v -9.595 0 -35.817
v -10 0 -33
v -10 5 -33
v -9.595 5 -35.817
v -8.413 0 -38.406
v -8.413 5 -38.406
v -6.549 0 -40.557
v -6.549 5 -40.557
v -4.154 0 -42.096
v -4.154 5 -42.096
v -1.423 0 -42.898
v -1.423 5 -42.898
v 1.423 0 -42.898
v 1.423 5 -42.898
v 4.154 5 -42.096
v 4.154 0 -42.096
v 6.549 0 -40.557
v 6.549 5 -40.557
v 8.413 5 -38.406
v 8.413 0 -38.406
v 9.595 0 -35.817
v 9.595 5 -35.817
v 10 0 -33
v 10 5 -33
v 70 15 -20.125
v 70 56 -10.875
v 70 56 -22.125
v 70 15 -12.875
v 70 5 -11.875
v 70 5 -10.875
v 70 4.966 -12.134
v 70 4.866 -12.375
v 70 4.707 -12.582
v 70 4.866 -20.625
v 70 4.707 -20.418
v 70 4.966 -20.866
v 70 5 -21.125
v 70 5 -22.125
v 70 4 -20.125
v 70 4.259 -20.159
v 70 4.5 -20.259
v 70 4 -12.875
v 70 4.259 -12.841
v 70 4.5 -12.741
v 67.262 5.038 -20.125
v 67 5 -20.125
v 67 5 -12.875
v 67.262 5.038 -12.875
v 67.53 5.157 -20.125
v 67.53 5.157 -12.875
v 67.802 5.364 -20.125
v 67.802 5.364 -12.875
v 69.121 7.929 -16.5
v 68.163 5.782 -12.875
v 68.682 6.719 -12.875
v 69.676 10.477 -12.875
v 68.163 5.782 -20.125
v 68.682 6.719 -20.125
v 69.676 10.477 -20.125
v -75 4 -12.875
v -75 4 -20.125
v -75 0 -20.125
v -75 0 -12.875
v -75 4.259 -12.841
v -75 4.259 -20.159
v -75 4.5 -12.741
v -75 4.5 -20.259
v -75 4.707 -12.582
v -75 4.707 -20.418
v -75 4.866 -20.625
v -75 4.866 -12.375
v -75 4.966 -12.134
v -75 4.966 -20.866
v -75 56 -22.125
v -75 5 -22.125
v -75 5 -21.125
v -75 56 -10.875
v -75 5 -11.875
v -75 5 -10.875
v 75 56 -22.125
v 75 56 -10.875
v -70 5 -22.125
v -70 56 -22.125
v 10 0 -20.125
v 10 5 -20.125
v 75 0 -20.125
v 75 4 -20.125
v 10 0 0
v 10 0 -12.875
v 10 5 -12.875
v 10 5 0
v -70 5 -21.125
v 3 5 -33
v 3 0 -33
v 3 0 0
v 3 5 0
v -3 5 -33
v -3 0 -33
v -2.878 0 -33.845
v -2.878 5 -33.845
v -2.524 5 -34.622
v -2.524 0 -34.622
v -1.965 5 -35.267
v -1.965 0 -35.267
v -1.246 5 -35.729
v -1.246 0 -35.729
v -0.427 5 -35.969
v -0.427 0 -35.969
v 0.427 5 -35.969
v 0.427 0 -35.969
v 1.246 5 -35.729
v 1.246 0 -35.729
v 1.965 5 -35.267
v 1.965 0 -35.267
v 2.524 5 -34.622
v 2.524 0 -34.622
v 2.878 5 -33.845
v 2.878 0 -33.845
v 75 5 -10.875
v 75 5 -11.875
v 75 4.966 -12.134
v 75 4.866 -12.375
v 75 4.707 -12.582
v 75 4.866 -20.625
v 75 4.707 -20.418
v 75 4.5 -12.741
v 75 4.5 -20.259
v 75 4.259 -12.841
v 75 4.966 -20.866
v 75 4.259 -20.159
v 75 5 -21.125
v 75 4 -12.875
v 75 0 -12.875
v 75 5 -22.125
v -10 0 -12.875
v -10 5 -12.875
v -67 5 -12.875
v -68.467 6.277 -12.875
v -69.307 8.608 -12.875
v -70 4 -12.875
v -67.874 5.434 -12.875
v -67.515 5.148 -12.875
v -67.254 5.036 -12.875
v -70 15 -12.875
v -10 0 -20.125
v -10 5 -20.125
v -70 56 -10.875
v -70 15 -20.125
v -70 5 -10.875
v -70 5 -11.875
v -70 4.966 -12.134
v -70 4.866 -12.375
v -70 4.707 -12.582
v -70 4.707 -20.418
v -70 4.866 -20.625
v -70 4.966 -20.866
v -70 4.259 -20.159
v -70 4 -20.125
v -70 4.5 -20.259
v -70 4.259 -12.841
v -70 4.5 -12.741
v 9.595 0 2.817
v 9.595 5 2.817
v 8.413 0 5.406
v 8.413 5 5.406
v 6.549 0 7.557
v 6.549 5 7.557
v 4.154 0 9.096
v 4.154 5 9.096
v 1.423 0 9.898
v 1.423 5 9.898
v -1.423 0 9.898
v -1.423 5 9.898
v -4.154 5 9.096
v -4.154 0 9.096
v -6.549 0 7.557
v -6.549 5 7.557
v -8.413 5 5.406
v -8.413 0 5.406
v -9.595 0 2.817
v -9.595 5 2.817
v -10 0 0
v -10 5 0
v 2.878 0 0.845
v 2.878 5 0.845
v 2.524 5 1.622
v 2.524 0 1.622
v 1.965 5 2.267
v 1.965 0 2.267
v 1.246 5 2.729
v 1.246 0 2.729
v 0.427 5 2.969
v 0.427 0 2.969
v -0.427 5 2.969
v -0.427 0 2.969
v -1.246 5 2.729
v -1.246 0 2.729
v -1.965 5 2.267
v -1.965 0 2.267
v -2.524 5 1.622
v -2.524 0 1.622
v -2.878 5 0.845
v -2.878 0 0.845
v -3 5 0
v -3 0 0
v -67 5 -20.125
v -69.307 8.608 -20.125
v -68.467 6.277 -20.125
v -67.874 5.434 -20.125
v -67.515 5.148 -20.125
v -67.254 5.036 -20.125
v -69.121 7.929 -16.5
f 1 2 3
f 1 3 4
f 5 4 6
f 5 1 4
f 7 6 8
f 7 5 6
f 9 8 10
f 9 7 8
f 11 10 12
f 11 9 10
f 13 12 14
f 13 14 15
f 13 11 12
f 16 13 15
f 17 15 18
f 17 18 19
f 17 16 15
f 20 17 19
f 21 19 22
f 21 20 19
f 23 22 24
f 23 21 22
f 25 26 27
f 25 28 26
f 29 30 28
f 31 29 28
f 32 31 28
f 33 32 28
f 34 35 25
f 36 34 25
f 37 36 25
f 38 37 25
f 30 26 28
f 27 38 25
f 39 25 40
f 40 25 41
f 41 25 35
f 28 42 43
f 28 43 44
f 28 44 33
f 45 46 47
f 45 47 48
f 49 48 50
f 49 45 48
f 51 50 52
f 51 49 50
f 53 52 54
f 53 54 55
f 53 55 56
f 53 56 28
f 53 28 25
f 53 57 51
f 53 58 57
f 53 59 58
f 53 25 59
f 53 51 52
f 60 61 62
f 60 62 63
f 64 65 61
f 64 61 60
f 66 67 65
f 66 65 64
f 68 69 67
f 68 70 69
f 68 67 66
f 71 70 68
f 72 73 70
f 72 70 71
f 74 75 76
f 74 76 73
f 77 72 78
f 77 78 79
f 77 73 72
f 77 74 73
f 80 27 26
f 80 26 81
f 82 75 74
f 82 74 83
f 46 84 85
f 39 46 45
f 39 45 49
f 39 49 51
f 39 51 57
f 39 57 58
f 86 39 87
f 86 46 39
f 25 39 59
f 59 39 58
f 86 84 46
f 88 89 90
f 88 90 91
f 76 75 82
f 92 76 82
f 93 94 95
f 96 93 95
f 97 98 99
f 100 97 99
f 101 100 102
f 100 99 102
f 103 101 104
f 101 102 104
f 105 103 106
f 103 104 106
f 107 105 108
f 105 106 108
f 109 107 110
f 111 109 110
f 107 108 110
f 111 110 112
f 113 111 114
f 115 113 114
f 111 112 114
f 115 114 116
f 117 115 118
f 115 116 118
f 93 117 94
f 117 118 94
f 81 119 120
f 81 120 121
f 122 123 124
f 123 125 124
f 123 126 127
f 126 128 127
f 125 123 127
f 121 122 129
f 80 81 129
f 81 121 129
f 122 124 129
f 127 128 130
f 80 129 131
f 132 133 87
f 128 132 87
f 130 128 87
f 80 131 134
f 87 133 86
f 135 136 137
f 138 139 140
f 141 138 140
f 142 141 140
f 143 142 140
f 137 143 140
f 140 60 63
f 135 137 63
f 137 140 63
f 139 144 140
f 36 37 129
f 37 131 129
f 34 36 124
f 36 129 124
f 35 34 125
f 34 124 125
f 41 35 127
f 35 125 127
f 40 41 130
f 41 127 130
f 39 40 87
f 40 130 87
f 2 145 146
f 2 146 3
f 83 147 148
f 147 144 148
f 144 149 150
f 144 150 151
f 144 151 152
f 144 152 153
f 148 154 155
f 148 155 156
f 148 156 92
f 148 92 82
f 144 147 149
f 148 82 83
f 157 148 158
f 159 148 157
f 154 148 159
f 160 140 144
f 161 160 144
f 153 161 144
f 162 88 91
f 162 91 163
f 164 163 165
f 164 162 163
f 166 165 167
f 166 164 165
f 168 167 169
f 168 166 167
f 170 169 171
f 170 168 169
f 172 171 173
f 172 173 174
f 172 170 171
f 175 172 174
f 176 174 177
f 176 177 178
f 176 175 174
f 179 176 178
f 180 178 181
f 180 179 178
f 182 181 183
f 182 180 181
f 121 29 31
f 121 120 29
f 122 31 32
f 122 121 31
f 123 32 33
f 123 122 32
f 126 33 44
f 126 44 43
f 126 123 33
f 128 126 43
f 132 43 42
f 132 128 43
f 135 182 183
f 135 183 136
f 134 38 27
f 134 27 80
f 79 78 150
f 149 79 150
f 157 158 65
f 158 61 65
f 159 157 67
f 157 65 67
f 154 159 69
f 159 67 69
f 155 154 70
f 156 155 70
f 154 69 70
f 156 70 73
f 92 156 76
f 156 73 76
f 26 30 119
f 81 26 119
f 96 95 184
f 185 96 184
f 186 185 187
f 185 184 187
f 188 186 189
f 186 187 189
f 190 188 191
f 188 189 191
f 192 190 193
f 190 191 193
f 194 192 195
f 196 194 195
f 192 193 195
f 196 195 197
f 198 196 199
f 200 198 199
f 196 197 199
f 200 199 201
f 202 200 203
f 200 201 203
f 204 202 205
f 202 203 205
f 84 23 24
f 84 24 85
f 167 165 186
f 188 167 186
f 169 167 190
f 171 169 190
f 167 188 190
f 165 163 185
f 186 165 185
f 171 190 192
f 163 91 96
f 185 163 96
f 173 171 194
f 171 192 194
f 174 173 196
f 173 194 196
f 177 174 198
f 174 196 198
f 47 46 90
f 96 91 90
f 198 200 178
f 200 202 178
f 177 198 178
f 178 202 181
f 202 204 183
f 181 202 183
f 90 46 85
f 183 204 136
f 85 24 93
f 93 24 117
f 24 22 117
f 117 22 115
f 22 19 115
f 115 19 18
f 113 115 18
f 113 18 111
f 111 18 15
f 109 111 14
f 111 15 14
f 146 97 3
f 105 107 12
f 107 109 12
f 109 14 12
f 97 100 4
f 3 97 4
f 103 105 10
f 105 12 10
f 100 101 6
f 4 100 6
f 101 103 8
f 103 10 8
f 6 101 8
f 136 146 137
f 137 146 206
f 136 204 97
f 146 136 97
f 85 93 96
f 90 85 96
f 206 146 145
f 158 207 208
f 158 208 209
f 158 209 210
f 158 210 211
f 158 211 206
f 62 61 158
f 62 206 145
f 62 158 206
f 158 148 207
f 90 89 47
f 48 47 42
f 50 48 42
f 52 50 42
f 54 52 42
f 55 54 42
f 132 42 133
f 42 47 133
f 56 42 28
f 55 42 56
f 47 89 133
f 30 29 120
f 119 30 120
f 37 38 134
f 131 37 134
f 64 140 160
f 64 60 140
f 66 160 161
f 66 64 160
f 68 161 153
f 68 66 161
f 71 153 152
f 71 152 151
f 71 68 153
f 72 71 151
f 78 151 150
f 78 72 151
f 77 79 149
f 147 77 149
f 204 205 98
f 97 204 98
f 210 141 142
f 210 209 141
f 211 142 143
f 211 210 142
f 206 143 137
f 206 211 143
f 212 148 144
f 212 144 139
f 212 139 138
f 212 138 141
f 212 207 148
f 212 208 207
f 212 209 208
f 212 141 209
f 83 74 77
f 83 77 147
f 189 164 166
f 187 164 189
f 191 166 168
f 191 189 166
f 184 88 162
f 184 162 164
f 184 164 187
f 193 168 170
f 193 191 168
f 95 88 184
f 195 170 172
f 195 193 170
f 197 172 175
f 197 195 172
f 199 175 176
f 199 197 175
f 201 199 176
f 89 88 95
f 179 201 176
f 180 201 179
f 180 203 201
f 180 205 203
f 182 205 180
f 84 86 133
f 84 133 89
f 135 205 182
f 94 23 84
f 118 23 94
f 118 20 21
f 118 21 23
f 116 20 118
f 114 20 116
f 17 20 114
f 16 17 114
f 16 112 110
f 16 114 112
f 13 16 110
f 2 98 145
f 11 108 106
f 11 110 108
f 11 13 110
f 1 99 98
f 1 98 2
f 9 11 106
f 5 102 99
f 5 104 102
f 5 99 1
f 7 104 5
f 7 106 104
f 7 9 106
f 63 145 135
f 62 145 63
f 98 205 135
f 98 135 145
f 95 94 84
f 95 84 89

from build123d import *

# Parameters (mm, degrees)
BOSS_EXTRUDE1_DEPTH = 5
SKETCH2_W           = 7.25
SKETCH2_H           = 5
BOSS_EXTRUDE2_DEPTH = 65
SKETCH3_W           = 7.25
SKETCH3_H           = 5
BOSS_EXTRUDE3_DEPTH = 65
SKETCH4_W           = 5
SKETCH4_H           = 11.25
BOSS_EXTRUDE4_DEPTH = 51
FILLET2_R           = 1
FILLET3_SIZE        = 3
FILLET3_SIZE_2      = 10


with BuildPart() as part:
    # Sketch1 → Boss-Extrude1 (new body)
    with BuildSketch(Plane(origin=(0, 0, 0), x_dir=(1, 0, 0), z_dir=(0, 1, 0))):
        with BuildLine():
            Line((10, 33), (10, 0))
            ThreePointArc((10, 0), (0, -10), (-10, 0))
            Line((-10, 0), (-10, 33))
            ThreePointArc((-10, 33), (0, 43), (10, 33))
        make_face()
        with BuildLine():
            Line((-3, 0), (-3, 33))
            ThreePointArc((-3, 33), (0, 36), (3, 33))
            Line((3, 33), (3, 0))
            ThreePointArc((3, 0), (0, -3), (-3, 0))
        make_face(mode=Mode.SUBTRACT)
    extrude(amount=BOSS_EXTRUDE1_DEPTH)

    # Sketch2 → Boss-Extrude2 (add)
    with BuildSketch(Plane(origin=(10, 0, 0), x_dir=(0, 0, -1), z_dir=(1, 0, 0))):
        with Locations((16.5, 2.5)):
            Rectangle(SKETCH2_W, SKETCH2_H)
    extrude(amount=BOSS_EXTRUDE2_DEPTH)

    # Sketch3 → Boss-Extrude3 (add)
    with BuildSketch(Plane.ZY.offset(10)):
        with Locations((-16.5, 2.5)):
            Rectangle(SKETCH3_W, SKETCH3_H)
    extrude(amount=BOSS_EXTRUDE3_DEPTH)

    # Sketch4 → Boss-Extrude4 (add)
    with BuildSketch(Plane(origin=(0, 5, 0), x_dir=(1, 0, 0), z_dir=(0, 1, 0))):
        with Locations((72.5, 16.5)):
            Rectangle(SKETCH4_W, SKETCH4_H)
        with Locations((-72.5, 16.5)):
            Rectangle(SKETCH4_W, SKETCH4_H)
    extrude(amount=BOSS_EXTRUDE4_DEPTH)

    # Fillet2
    fillet2_edges = [part.edges().sort_by_distance(p)[0] for p in [
        (72.5, 5, -20.125),
        (72.5, 5, -12.875),
        (-72.5, 5, -12.875),
        (-72.5, 5, -20.125),
    ]]
    fillet(fillet2_edges, radius=FILLET2_R)

    # Fillet3
    # an asymmetric fillet: 10, 3 mm, written as the material it adds along each edge
    with BuildSketch(Plane(origin=(70, 5, -20.125), x_dir=(-1, 0, 0), z_dir=(0, 0, 1))) as fillet3_piece_1:
        with BuildLine():
            Bezier((FILLET3_SIZE, 0), (0, 0), (0, -FILLET3_SIZE_2), weights=[1, 0.707106781, 1])
            Line((0, -FILLET3_SIZE_2), (0, 0))
            Line((0, 0), (FILLET3_SIZE, 0))
        make_face()
    extrude(amount=7.25)
    with BuildSketch(Plane(origin=(-70, 5, -20.125), x_dir=(0, 1, 0), z_dir=(0, 0, 1))) as fillet3_piece_2:
        with BuildLine():
            Bezier((FILLET3_SIZE_2, 0), (0, 0), (0, -FILLET3_SIZE), weights=[1, 0.707106781, 1])
            Line((0, -FILLET3_SIZE), (0, 0))
            Line((0, 0), (FILLET3_SIZE_2, 0))
        make_face()
    extrude(amount=7.25)


solid = part.part
